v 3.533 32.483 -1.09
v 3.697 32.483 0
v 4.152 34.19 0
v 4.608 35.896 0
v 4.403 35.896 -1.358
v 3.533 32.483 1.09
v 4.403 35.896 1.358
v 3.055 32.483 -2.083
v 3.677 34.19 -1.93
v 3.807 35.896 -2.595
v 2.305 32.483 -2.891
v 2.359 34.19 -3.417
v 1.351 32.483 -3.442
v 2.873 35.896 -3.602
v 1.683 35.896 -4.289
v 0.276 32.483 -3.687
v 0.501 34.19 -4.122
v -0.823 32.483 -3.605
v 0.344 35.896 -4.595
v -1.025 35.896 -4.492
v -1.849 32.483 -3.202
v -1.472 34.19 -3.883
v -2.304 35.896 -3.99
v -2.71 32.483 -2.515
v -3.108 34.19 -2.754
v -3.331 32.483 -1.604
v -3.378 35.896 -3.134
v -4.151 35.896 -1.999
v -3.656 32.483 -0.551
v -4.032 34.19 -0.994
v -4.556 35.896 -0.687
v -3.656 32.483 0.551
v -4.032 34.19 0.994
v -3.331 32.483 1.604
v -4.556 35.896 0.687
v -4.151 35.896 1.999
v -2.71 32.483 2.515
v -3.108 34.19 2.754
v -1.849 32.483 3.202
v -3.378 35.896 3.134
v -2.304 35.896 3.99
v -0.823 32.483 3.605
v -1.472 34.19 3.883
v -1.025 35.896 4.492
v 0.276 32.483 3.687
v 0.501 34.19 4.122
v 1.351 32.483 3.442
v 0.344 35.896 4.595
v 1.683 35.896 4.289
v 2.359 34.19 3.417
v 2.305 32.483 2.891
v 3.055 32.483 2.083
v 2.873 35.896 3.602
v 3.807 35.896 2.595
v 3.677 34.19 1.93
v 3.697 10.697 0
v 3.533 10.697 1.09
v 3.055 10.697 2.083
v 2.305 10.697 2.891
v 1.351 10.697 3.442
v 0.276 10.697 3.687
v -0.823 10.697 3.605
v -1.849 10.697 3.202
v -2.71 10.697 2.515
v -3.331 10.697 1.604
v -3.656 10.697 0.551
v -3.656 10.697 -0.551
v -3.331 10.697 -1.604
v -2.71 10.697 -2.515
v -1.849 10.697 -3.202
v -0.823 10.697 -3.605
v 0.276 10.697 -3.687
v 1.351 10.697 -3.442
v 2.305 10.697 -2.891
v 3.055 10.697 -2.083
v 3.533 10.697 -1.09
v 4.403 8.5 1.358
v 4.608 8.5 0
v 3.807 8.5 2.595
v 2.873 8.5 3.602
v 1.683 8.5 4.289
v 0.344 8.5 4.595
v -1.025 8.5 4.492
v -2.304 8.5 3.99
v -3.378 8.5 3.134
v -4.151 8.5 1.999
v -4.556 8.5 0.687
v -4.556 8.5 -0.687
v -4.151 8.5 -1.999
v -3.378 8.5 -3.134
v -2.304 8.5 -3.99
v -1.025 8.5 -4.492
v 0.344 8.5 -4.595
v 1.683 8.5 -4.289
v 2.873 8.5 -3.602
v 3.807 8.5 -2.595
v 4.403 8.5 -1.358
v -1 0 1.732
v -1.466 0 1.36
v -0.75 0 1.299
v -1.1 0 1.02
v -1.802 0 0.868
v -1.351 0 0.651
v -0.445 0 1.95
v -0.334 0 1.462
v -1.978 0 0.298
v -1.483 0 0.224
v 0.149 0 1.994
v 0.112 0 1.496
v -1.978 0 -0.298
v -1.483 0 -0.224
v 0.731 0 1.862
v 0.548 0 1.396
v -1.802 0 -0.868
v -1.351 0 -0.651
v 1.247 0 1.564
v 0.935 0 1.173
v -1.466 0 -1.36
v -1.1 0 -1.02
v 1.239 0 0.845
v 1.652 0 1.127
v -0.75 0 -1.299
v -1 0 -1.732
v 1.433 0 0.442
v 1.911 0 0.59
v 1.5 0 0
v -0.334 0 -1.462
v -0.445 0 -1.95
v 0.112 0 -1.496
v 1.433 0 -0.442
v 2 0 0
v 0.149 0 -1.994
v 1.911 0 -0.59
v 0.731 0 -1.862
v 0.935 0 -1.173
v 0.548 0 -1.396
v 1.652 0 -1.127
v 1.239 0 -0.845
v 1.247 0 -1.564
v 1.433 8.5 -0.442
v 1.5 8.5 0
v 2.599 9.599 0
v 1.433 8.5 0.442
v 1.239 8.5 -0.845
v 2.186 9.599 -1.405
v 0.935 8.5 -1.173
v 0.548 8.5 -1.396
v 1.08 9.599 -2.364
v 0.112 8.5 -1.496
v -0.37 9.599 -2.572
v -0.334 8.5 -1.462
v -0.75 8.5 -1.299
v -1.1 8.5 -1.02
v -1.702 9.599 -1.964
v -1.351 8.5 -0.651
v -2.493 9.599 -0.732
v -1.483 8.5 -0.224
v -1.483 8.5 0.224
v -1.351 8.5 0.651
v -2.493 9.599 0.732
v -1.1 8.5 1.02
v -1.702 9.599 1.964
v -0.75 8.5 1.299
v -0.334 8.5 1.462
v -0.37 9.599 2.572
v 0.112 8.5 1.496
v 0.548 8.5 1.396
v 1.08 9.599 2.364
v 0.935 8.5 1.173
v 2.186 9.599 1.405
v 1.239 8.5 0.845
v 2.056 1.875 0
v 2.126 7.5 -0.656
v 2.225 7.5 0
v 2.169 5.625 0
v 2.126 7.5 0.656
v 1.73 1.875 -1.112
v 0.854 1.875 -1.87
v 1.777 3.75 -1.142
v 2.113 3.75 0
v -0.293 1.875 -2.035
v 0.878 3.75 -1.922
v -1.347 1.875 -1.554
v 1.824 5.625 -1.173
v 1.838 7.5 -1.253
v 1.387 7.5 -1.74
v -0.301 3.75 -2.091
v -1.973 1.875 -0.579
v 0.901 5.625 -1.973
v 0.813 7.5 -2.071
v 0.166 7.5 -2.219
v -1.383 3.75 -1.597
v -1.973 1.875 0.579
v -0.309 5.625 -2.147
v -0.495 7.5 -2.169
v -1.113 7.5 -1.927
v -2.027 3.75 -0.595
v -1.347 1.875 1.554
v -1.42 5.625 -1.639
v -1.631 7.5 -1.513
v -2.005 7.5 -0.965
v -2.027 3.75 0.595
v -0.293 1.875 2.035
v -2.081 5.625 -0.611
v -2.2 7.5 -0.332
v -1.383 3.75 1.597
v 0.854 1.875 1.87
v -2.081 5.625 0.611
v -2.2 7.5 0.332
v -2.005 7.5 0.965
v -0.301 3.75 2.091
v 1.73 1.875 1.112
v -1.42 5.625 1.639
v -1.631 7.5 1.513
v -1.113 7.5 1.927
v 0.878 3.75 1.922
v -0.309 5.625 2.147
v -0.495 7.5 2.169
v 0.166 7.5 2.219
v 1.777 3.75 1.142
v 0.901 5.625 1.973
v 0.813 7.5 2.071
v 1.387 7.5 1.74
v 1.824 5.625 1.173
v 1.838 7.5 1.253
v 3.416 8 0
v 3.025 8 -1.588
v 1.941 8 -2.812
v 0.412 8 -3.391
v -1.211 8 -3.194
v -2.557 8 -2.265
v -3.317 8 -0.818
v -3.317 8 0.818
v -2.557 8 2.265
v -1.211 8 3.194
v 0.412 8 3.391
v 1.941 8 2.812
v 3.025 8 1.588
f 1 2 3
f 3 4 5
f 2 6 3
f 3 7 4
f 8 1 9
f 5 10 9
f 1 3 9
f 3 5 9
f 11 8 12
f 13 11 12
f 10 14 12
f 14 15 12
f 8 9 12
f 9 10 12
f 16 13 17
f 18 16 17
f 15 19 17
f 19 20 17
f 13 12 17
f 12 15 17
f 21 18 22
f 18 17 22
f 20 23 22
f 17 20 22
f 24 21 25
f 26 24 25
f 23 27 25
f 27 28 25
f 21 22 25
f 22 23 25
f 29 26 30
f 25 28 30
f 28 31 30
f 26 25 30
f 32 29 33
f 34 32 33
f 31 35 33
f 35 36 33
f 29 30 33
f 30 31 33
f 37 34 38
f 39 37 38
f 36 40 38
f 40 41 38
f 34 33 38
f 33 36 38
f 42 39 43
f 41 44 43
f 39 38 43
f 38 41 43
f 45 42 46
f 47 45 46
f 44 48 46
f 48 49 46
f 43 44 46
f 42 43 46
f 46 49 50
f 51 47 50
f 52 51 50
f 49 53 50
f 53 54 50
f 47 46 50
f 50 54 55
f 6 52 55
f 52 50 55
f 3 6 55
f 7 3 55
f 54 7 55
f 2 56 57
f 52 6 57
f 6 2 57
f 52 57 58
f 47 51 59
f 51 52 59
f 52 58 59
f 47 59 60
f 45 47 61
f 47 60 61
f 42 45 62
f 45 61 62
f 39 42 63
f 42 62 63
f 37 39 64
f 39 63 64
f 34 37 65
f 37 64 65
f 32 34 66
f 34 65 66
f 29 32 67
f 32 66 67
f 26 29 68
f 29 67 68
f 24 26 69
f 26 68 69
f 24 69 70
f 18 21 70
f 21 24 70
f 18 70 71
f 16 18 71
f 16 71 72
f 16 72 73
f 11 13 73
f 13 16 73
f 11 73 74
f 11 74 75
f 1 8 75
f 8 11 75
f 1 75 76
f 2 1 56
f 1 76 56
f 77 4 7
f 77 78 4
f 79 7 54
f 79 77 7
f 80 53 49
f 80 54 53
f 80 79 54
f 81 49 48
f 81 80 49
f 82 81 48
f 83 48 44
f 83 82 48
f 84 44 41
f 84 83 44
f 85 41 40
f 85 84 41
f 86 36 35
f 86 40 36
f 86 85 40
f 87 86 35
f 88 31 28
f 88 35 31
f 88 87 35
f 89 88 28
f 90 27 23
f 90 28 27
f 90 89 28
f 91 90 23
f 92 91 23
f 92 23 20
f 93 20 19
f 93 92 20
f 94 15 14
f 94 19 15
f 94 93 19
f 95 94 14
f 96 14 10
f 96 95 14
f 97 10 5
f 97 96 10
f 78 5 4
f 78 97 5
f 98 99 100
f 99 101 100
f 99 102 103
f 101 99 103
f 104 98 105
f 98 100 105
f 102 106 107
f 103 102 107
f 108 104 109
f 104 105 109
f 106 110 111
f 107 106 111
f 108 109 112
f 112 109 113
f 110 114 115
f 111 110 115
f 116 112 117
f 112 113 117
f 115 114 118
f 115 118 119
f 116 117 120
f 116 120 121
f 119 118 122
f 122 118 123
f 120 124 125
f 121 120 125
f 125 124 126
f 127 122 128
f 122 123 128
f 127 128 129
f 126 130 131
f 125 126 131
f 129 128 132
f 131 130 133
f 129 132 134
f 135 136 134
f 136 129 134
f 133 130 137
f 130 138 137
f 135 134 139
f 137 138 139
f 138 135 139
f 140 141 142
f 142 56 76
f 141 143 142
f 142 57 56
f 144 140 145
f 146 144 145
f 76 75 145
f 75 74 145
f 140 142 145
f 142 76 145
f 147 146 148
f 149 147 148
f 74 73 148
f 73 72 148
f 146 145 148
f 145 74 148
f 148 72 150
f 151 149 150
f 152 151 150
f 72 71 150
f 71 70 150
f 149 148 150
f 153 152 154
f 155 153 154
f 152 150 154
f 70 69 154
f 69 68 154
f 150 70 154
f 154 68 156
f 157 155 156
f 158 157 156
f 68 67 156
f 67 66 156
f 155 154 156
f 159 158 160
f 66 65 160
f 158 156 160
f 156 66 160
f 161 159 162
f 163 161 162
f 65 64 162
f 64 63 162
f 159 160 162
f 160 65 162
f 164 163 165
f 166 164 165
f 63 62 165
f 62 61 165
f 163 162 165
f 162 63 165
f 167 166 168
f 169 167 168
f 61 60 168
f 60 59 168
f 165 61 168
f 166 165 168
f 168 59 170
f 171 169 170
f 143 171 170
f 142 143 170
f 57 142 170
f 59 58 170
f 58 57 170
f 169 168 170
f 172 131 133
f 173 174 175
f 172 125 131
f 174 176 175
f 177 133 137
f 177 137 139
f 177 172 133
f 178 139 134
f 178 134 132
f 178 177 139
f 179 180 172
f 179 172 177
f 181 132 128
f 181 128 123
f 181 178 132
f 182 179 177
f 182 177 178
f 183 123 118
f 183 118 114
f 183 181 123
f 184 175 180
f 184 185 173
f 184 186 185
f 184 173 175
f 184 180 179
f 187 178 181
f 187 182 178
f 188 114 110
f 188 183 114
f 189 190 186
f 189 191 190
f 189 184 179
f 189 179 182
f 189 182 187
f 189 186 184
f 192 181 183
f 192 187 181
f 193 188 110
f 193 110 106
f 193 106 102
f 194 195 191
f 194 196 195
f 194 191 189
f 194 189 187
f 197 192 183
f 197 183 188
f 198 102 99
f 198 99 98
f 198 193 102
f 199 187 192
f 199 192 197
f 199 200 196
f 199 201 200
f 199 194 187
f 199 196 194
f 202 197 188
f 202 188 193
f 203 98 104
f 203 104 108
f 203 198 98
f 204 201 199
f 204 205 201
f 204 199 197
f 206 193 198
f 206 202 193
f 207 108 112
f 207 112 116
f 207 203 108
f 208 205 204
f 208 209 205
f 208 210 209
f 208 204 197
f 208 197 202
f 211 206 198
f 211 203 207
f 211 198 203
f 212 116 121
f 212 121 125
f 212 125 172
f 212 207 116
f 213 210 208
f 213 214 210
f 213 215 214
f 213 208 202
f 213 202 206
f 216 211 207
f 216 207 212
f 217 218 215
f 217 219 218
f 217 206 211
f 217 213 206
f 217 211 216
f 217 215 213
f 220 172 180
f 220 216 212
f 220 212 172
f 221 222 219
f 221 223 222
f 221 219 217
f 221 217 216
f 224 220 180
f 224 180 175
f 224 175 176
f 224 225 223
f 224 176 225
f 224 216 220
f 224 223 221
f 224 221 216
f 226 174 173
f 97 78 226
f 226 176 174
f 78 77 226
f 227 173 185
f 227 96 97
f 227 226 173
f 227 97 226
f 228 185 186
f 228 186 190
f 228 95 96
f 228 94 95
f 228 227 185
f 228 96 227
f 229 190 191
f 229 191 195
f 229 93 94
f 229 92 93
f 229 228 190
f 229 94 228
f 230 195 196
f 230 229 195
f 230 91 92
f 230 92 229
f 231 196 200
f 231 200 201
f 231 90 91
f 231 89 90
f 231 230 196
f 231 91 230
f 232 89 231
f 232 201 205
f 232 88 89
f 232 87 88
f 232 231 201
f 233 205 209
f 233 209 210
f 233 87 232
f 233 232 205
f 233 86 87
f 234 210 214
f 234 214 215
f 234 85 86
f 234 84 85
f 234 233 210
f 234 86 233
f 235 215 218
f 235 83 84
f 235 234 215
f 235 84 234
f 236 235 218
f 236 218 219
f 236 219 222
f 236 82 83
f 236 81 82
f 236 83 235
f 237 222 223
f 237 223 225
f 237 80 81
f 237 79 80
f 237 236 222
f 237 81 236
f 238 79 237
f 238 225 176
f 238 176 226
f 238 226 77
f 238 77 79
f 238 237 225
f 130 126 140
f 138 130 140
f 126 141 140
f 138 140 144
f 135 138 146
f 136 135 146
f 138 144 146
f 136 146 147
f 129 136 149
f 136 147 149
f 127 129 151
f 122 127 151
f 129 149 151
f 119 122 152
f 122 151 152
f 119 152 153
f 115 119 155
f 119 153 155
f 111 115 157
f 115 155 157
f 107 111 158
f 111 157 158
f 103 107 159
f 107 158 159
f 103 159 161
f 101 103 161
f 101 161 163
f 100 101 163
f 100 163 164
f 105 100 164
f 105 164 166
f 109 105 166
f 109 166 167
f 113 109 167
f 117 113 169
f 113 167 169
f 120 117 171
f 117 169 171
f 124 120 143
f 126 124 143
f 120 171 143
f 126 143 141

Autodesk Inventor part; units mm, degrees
ref_plane "YZ Plane" through (0, 0, 0) normal (1, 0, 0) x (0, 1, 0)
ref_plane "XZ Plane" through (0, 0, 0) normal (0, 1, 0) x (-1, 0, 0)
ref_plane "XY Plane" through (0, 0, 0) normal (0, 0, 1) x (1, 0, 0)
sketch "Sketch1" plane through (0, 0, 0) normal (0, 0, 1) x (1, 0, 0)
  line L0 (0, 0) -> (2, 0)
  line L1 (2.225, 7.5) -> (2, 0)
  line L2 (2, 0) -> (1.5, 0)
  line L3 (1.5, 0) -> (1.5, 8.5)
  line L4 (2, 0) -> (1.5, 0)
  line L5 (0.1075, 35.8962) -> (4.6075, 35.8962) construction
  line L6 (3.6973, 32.4828) -> (4.6075, 35.8962)
  line L7 (3.6973, 32.4828) -> (28.4522, 32.4828) construction
  line L8 (1.5, 8.5) -> (3.6973, 10.6973)
  line L9 (1.5, 8.5) -> (4.6075, 8.5) construction
  line L10 (4.6075, 35.8962) -> (4.6075, 8.5)
  line L11 (2.225, 7.5) -> (4.6075, 8.5)
  line L12 (3.6973, 32.4828) -> (3.6973, 10.6973)
  line L13 (2, 0) -> (1.5, 0)
  line L14 (1.5, 0) -> (2, 0)
  line L15 (0, 0) -> (0, 42.8273)
  dimension "d0" = 2
  dimension "d6" = 8.5
  dimension "d20" = 45
revolve "Revolution1" add sketch "Sketch1" angle 360 about axis through (0, 0, 0) along (0, 1, 0)
properties part number "Pipet to Needle"
